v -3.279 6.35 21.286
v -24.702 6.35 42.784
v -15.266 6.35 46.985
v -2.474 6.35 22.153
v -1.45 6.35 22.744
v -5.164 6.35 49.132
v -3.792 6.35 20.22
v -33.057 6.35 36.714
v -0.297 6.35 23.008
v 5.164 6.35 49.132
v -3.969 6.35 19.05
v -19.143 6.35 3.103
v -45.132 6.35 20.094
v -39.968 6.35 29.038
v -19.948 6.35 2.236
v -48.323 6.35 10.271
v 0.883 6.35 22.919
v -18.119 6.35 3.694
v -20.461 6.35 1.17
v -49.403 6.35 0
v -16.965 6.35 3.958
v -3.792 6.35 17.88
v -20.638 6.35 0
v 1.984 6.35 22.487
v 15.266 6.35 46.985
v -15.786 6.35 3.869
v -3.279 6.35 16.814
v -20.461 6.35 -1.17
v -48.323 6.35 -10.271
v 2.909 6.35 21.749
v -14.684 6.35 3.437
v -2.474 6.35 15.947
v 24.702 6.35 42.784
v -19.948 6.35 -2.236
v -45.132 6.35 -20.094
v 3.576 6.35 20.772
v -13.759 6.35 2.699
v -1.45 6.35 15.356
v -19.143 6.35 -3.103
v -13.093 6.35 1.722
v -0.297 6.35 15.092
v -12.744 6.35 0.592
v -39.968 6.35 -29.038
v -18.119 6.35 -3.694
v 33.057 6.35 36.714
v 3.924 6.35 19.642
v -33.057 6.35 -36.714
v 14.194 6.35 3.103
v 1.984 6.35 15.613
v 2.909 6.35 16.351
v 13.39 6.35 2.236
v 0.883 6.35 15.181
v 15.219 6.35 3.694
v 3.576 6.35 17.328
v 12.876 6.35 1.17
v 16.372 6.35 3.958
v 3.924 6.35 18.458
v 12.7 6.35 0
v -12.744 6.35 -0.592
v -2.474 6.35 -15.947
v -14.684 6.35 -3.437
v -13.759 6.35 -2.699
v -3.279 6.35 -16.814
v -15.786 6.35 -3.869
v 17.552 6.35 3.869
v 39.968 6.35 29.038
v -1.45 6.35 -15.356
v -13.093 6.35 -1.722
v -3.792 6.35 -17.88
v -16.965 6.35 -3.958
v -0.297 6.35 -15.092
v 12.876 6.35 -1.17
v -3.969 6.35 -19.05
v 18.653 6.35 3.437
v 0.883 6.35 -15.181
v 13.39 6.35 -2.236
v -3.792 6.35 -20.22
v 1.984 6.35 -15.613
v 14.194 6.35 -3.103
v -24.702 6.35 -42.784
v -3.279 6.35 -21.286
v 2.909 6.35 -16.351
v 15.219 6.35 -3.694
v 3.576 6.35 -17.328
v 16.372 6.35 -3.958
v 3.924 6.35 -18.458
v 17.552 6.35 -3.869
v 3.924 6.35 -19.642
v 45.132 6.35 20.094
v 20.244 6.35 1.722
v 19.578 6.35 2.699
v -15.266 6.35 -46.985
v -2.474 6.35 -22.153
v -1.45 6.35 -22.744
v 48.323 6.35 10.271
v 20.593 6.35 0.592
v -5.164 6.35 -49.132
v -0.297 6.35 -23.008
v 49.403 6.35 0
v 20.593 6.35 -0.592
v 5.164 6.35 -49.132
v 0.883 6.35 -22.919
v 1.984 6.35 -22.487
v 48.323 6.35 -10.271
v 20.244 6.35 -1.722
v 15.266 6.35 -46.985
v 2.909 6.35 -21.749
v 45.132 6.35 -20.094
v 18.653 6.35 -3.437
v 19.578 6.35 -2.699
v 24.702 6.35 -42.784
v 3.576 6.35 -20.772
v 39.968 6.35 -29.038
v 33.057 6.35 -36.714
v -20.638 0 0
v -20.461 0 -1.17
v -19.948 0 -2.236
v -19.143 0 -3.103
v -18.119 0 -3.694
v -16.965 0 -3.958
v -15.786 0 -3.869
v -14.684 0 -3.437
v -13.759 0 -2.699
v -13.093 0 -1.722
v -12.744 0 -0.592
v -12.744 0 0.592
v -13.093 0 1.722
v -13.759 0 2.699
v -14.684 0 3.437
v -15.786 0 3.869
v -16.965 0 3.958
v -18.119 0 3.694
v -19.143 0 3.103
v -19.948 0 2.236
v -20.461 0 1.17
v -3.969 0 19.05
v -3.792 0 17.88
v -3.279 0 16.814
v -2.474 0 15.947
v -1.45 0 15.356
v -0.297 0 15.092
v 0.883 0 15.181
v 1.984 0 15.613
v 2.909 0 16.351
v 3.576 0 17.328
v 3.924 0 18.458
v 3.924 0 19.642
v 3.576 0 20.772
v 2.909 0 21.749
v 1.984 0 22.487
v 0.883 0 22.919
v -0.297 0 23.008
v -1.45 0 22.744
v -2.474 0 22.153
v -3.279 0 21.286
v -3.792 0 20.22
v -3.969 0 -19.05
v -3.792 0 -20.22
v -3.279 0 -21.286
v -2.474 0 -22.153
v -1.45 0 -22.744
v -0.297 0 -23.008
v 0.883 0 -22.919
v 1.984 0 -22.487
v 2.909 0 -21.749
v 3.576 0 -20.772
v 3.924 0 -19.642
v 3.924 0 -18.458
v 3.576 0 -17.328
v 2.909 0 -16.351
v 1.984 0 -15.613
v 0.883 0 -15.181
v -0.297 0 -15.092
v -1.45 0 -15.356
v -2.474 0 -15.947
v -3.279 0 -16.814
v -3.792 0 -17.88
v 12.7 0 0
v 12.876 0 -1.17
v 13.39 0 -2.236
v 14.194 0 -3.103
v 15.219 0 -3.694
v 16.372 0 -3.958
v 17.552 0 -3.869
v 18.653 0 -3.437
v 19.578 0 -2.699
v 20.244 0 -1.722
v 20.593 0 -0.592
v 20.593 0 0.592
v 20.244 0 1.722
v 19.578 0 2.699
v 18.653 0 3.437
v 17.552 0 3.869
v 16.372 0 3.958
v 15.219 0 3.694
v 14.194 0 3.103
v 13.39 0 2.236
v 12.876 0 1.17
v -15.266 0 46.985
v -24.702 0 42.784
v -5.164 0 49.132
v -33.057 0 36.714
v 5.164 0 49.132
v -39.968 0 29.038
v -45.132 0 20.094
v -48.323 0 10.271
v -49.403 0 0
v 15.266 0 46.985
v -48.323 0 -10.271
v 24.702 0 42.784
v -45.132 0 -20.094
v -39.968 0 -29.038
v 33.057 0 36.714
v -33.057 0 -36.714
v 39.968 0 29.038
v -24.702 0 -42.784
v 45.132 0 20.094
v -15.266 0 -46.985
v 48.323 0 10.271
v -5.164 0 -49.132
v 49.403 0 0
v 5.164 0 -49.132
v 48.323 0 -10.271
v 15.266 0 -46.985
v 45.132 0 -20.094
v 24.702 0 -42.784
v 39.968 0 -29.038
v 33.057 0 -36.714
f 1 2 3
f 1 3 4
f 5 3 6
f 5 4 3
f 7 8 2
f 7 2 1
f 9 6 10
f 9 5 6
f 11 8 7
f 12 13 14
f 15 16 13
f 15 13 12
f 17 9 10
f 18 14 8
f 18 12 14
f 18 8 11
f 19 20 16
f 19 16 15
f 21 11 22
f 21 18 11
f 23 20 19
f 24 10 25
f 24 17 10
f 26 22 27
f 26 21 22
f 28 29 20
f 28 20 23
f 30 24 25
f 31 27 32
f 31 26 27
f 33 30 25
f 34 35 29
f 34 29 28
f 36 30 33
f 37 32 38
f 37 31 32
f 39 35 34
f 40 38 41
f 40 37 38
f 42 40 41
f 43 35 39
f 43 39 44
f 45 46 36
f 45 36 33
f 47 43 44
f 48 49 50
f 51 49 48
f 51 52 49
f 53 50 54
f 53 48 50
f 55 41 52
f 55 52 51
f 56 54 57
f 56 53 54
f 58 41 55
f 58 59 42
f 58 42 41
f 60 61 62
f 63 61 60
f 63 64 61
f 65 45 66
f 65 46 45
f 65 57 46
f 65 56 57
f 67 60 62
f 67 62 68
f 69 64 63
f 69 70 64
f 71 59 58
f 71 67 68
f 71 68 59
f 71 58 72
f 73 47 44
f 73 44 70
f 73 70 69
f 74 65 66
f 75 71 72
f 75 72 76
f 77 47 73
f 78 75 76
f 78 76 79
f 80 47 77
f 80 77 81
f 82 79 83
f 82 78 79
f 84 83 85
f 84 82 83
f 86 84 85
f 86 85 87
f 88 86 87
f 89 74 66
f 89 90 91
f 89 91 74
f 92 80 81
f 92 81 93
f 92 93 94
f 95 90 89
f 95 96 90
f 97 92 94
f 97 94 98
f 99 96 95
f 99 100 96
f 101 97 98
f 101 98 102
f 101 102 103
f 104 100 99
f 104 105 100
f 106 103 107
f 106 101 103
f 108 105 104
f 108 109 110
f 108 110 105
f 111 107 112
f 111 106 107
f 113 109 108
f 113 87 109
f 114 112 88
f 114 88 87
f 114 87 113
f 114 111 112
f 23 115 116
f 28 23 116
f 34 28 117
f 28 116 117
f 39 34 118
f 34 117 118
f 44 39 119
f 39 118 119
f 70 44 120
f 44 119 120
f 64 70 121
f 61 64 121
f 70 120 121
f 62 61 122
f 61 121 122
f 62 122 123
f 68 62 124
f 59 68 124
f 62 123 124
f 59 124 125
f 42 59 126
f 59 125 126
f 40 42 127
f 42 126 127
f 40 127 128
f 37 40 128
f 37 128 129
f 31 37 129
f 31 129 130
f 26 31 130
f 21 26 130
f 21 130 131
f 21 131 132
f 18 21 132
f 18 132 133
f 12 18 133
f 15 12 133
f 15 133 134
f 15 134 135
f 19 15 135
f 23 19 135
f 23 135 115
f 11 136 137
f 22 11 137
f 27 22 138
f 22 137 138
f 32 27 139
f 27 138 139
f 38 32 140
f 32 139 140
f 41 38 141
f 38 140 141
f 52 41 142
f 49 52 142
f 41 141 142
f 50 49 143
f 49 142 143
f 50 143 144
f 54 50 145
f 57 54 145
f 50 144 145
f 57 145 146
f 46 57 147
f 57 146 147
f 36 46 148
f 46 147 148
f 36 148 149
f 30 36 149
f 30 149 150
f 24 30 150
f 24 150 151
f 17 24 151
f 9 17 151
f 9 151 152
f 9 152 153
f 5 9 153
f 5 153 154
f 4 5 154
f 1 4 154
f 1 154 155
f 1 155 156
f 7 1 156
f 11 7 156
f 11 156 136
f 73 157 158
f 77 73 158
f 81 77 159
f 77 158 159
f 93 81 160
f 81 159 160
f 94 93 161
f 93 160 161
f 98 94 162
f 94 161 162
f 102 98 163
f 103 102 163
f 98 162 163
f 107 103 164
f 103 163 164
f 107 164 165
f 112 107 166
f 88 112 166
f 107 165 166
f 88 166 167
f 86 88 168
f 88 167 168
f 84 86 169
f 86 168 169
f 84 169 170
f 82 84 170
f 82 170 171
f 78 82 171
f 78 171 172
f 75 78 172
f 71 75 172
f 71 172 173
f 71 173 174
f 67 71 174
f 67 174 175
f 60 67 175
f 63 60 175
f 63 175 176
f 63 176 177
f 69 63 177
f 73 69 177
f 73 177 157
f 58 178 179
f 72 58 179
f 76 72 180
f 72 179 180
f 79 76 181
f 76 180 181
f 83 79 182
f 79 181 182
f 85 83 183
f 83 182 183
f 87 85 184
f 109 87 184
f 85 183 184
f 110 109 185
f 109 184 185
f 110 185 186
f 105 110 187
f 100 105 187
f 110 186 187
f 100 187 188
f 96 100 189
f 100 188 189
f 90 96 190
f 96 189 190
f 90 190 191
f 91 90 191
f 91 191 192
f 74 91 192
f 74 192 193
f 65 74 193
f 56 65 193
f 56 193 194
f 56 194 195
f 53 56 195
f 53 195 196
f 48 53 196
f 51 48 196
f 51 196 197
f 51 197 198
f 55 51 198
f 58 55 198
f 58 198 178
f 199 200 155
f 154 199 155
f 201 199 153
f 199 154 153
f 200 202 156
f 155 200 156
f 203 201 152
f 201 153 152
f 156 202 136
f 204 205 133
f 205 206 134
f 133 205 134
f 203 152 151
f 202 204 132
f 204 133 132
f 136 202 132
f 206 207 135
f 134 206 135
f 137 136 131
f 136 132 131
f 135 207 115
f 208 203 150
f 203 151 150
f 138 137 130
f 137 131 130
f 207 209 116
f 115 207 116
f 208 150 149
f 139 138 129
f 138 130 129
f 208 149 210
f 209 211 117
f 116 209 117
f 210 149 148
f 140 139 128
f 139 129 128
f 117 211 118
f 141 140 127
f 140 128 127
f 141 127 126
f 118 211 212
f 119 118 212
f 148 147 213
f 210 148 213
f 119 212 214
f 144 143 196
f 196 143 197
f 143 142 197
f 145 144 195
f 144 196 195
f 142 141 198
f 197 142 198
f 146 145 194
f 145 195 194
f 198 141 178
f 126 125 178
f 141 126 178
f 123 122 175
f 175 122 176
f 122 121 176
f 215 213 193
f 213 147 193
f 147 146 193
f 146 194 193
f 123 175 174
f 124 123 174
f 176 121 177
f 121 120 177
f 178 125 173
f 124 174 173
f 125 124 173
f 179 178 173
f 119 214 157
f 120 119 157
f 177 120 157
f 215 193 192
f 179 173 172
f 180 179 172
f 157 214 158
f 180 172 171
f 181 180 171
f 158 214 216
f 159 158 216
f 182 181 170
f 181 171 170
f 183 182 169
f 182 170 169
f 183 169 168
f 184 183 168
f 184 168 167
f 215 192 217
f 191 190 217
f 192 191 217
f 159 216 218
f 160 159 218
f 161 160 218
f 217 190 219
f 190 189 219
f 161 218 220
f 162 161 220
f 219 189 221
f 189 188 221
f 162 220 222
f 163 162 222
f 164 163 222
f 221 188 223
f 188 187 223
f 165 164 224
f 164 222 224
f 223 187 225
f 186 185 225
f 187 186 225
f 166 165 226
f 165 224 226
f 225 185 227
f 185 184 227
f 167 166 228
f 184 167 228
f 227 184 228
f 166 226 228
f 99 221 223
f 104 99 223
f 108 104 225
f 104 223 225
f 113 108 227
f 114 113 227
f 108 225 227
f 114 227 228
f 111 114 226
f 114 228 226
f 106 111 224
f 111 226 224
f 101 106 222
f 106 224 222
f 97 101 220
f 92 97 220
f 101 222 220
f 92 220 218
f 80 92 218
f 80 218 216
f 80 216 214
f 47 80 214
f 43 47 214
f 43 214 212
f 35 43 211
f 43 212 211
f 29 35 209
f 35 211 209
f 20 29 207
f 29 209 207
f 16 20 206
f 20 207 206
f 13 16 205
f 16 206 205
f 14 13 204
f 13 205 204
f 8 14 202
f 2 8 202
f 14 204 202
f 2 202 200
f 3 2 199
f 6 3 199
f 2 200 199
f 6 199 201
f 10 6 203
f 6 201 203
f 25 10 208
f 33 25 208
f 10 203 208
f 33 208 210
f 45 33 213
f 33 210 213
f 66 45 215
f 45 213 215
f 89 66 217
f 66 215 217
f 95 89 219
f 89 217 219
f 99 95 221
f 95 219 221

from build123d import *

# Parameters (mm, degrees)
SKETCH1_R            = 49.403
BOSS_EXTRUDE1_DEPTH  = 6.35
THREADED_ROD_HOLES_D = 7.9375
U_BOLT_HOLES_D       = 7.9375


with BuildPart() as part:
    # Sketch1 → Boss-Extrude1 (new body)
    with BuildSketch(Plane(origin=(0, 0, 0), x_dir=(1, 0, 0), z_dir=(0, 1, 0))):
        Circle(SKETCH1_R)
    extrude(amount=BOSS_EXTRUDE1_DEPTH)

    # Threaded Rod Holes (through all)
    with Locations(Plane(origin=(0, 6.35, 0), x_dir=(1, 0, 0), z_dir=(0, 1, 0))):
        with Locations((0, 19.05), (0, -19.05)):
            Hole(THREADED_ROD_HOLES_D / 2)

    # U-Bolt Holes (through all)
    with Locations(Plane(origin=(0, 6.35, 0), x_dir=(1, 0, 0), z_dir=(0, 1, 0))):
        with Locations((-16.66875, 0), (16.66875, 0)):
            Hole(U_BOLT_HOLES_D / 2)


solid = part.part
